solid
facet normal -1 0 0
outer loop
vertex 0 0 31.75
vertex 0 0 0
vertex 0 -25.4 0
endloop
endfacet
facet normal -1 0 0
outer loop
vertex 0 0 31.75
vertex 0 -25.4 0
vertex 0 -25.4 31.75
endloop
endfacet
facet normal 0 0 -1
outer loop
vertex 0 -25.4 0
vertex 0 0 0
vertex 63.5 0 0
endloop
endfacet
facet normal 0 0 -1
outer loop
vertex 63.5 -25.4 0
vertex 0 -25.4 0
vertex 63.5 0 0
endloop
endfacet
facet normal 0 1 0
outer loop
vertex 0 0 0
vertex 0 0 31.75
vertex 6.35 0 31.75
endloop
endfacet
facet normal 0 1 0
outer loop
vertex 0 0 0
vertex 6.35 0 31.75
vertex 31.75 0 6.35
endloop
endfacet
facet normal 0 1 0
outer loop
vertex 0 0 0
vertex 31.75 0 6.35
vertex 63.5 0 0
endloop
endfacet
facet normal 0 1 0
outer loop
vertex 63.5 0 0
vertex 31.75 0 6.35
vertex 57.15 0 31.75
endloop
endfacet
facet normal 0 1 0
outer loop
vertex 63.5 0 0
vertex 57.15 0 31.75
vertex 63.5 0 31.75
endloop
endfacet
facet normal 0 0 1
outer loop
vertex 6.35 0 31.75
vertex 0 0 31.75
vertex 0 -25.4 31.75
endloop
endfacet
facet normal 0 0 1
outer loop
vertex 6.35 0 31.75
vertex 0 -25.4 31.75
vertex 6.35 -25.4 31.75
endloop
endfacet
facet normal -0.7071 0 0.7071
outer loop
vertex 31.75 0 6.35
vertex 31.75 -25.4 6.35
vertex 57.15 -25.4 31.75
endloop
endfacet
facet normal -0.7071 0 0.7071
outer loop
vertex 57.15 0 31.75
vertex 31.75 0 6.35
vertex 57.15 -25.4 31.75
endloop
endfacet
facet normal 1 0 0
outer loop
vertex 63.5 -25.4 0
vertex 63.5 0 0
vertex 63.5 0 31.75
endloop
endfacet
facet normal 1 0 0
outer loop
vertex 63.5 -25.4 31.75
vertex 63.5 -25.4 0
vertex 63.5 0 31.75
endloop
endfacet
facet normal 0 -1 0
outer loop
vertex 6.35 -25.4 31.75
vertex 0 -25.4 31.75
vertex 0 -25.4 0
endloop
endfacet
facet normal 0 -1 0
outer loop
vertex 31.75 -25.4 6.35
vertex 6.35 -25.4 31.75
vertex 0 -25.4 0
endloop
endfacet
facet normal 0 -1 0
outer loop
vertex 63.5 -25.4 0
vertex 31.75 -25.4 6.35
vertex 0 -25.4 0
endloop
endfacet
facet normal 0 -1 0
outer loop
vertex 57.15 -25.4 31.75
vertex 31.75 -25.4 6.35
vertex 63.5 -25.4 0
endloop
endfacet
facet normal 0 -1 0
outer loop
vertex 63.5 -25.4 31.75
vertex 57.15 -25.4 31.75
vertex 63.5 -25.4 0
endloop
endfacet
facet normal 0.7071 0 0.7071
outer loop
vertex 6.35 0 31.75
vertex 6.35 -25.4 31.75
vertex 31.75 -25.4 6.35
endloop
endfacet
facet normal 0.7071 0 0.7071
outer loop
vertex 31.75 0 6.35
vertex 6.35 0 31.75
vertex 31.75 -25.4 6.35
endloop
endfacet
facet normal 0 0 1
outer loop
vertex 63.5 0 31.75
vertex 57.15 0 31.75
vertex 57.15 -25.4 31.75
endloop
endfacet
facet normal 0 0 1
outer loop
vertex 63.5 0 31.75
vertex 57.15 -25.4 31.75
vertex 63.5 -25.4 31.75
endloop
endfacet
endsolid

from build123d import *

# Parameters (mm, degrees)
F0_W     = 63.5
F0_H     = 31.75
F1_DEPTH = 25.4
F3_DEPTH = 25.4


with BuildPart() as f1:
    # F0 (on Front) → F1 (new body)
    with BuildSketch(Plane.XZ):
        with Locations((31.75, 15.875)):
            Rectangle(F0_W, F0_H)
    extrude(amount=F1_DEPTH)

    # F2 (on face) → F3 (cut)
    with BuildSketch(Plane.XZ.offset(25.4)):
        Polygon((44.45, 31.75), (19.05, 31.75), (31.75, 19.05), align=None)
        Polygon((19.05, 31.75), (6.35, 31.75), (31.75, 6.35), (31.75, 19.05), align=None)
        Polygon((31.75, 19.05), (31.75, 6.35), (57.15, 31.75), (44.45, 31.75), align=None)
    extrude(amount=-F3_DEPTH, mode=Mode.SUBTRACT)


solid = f1.part
